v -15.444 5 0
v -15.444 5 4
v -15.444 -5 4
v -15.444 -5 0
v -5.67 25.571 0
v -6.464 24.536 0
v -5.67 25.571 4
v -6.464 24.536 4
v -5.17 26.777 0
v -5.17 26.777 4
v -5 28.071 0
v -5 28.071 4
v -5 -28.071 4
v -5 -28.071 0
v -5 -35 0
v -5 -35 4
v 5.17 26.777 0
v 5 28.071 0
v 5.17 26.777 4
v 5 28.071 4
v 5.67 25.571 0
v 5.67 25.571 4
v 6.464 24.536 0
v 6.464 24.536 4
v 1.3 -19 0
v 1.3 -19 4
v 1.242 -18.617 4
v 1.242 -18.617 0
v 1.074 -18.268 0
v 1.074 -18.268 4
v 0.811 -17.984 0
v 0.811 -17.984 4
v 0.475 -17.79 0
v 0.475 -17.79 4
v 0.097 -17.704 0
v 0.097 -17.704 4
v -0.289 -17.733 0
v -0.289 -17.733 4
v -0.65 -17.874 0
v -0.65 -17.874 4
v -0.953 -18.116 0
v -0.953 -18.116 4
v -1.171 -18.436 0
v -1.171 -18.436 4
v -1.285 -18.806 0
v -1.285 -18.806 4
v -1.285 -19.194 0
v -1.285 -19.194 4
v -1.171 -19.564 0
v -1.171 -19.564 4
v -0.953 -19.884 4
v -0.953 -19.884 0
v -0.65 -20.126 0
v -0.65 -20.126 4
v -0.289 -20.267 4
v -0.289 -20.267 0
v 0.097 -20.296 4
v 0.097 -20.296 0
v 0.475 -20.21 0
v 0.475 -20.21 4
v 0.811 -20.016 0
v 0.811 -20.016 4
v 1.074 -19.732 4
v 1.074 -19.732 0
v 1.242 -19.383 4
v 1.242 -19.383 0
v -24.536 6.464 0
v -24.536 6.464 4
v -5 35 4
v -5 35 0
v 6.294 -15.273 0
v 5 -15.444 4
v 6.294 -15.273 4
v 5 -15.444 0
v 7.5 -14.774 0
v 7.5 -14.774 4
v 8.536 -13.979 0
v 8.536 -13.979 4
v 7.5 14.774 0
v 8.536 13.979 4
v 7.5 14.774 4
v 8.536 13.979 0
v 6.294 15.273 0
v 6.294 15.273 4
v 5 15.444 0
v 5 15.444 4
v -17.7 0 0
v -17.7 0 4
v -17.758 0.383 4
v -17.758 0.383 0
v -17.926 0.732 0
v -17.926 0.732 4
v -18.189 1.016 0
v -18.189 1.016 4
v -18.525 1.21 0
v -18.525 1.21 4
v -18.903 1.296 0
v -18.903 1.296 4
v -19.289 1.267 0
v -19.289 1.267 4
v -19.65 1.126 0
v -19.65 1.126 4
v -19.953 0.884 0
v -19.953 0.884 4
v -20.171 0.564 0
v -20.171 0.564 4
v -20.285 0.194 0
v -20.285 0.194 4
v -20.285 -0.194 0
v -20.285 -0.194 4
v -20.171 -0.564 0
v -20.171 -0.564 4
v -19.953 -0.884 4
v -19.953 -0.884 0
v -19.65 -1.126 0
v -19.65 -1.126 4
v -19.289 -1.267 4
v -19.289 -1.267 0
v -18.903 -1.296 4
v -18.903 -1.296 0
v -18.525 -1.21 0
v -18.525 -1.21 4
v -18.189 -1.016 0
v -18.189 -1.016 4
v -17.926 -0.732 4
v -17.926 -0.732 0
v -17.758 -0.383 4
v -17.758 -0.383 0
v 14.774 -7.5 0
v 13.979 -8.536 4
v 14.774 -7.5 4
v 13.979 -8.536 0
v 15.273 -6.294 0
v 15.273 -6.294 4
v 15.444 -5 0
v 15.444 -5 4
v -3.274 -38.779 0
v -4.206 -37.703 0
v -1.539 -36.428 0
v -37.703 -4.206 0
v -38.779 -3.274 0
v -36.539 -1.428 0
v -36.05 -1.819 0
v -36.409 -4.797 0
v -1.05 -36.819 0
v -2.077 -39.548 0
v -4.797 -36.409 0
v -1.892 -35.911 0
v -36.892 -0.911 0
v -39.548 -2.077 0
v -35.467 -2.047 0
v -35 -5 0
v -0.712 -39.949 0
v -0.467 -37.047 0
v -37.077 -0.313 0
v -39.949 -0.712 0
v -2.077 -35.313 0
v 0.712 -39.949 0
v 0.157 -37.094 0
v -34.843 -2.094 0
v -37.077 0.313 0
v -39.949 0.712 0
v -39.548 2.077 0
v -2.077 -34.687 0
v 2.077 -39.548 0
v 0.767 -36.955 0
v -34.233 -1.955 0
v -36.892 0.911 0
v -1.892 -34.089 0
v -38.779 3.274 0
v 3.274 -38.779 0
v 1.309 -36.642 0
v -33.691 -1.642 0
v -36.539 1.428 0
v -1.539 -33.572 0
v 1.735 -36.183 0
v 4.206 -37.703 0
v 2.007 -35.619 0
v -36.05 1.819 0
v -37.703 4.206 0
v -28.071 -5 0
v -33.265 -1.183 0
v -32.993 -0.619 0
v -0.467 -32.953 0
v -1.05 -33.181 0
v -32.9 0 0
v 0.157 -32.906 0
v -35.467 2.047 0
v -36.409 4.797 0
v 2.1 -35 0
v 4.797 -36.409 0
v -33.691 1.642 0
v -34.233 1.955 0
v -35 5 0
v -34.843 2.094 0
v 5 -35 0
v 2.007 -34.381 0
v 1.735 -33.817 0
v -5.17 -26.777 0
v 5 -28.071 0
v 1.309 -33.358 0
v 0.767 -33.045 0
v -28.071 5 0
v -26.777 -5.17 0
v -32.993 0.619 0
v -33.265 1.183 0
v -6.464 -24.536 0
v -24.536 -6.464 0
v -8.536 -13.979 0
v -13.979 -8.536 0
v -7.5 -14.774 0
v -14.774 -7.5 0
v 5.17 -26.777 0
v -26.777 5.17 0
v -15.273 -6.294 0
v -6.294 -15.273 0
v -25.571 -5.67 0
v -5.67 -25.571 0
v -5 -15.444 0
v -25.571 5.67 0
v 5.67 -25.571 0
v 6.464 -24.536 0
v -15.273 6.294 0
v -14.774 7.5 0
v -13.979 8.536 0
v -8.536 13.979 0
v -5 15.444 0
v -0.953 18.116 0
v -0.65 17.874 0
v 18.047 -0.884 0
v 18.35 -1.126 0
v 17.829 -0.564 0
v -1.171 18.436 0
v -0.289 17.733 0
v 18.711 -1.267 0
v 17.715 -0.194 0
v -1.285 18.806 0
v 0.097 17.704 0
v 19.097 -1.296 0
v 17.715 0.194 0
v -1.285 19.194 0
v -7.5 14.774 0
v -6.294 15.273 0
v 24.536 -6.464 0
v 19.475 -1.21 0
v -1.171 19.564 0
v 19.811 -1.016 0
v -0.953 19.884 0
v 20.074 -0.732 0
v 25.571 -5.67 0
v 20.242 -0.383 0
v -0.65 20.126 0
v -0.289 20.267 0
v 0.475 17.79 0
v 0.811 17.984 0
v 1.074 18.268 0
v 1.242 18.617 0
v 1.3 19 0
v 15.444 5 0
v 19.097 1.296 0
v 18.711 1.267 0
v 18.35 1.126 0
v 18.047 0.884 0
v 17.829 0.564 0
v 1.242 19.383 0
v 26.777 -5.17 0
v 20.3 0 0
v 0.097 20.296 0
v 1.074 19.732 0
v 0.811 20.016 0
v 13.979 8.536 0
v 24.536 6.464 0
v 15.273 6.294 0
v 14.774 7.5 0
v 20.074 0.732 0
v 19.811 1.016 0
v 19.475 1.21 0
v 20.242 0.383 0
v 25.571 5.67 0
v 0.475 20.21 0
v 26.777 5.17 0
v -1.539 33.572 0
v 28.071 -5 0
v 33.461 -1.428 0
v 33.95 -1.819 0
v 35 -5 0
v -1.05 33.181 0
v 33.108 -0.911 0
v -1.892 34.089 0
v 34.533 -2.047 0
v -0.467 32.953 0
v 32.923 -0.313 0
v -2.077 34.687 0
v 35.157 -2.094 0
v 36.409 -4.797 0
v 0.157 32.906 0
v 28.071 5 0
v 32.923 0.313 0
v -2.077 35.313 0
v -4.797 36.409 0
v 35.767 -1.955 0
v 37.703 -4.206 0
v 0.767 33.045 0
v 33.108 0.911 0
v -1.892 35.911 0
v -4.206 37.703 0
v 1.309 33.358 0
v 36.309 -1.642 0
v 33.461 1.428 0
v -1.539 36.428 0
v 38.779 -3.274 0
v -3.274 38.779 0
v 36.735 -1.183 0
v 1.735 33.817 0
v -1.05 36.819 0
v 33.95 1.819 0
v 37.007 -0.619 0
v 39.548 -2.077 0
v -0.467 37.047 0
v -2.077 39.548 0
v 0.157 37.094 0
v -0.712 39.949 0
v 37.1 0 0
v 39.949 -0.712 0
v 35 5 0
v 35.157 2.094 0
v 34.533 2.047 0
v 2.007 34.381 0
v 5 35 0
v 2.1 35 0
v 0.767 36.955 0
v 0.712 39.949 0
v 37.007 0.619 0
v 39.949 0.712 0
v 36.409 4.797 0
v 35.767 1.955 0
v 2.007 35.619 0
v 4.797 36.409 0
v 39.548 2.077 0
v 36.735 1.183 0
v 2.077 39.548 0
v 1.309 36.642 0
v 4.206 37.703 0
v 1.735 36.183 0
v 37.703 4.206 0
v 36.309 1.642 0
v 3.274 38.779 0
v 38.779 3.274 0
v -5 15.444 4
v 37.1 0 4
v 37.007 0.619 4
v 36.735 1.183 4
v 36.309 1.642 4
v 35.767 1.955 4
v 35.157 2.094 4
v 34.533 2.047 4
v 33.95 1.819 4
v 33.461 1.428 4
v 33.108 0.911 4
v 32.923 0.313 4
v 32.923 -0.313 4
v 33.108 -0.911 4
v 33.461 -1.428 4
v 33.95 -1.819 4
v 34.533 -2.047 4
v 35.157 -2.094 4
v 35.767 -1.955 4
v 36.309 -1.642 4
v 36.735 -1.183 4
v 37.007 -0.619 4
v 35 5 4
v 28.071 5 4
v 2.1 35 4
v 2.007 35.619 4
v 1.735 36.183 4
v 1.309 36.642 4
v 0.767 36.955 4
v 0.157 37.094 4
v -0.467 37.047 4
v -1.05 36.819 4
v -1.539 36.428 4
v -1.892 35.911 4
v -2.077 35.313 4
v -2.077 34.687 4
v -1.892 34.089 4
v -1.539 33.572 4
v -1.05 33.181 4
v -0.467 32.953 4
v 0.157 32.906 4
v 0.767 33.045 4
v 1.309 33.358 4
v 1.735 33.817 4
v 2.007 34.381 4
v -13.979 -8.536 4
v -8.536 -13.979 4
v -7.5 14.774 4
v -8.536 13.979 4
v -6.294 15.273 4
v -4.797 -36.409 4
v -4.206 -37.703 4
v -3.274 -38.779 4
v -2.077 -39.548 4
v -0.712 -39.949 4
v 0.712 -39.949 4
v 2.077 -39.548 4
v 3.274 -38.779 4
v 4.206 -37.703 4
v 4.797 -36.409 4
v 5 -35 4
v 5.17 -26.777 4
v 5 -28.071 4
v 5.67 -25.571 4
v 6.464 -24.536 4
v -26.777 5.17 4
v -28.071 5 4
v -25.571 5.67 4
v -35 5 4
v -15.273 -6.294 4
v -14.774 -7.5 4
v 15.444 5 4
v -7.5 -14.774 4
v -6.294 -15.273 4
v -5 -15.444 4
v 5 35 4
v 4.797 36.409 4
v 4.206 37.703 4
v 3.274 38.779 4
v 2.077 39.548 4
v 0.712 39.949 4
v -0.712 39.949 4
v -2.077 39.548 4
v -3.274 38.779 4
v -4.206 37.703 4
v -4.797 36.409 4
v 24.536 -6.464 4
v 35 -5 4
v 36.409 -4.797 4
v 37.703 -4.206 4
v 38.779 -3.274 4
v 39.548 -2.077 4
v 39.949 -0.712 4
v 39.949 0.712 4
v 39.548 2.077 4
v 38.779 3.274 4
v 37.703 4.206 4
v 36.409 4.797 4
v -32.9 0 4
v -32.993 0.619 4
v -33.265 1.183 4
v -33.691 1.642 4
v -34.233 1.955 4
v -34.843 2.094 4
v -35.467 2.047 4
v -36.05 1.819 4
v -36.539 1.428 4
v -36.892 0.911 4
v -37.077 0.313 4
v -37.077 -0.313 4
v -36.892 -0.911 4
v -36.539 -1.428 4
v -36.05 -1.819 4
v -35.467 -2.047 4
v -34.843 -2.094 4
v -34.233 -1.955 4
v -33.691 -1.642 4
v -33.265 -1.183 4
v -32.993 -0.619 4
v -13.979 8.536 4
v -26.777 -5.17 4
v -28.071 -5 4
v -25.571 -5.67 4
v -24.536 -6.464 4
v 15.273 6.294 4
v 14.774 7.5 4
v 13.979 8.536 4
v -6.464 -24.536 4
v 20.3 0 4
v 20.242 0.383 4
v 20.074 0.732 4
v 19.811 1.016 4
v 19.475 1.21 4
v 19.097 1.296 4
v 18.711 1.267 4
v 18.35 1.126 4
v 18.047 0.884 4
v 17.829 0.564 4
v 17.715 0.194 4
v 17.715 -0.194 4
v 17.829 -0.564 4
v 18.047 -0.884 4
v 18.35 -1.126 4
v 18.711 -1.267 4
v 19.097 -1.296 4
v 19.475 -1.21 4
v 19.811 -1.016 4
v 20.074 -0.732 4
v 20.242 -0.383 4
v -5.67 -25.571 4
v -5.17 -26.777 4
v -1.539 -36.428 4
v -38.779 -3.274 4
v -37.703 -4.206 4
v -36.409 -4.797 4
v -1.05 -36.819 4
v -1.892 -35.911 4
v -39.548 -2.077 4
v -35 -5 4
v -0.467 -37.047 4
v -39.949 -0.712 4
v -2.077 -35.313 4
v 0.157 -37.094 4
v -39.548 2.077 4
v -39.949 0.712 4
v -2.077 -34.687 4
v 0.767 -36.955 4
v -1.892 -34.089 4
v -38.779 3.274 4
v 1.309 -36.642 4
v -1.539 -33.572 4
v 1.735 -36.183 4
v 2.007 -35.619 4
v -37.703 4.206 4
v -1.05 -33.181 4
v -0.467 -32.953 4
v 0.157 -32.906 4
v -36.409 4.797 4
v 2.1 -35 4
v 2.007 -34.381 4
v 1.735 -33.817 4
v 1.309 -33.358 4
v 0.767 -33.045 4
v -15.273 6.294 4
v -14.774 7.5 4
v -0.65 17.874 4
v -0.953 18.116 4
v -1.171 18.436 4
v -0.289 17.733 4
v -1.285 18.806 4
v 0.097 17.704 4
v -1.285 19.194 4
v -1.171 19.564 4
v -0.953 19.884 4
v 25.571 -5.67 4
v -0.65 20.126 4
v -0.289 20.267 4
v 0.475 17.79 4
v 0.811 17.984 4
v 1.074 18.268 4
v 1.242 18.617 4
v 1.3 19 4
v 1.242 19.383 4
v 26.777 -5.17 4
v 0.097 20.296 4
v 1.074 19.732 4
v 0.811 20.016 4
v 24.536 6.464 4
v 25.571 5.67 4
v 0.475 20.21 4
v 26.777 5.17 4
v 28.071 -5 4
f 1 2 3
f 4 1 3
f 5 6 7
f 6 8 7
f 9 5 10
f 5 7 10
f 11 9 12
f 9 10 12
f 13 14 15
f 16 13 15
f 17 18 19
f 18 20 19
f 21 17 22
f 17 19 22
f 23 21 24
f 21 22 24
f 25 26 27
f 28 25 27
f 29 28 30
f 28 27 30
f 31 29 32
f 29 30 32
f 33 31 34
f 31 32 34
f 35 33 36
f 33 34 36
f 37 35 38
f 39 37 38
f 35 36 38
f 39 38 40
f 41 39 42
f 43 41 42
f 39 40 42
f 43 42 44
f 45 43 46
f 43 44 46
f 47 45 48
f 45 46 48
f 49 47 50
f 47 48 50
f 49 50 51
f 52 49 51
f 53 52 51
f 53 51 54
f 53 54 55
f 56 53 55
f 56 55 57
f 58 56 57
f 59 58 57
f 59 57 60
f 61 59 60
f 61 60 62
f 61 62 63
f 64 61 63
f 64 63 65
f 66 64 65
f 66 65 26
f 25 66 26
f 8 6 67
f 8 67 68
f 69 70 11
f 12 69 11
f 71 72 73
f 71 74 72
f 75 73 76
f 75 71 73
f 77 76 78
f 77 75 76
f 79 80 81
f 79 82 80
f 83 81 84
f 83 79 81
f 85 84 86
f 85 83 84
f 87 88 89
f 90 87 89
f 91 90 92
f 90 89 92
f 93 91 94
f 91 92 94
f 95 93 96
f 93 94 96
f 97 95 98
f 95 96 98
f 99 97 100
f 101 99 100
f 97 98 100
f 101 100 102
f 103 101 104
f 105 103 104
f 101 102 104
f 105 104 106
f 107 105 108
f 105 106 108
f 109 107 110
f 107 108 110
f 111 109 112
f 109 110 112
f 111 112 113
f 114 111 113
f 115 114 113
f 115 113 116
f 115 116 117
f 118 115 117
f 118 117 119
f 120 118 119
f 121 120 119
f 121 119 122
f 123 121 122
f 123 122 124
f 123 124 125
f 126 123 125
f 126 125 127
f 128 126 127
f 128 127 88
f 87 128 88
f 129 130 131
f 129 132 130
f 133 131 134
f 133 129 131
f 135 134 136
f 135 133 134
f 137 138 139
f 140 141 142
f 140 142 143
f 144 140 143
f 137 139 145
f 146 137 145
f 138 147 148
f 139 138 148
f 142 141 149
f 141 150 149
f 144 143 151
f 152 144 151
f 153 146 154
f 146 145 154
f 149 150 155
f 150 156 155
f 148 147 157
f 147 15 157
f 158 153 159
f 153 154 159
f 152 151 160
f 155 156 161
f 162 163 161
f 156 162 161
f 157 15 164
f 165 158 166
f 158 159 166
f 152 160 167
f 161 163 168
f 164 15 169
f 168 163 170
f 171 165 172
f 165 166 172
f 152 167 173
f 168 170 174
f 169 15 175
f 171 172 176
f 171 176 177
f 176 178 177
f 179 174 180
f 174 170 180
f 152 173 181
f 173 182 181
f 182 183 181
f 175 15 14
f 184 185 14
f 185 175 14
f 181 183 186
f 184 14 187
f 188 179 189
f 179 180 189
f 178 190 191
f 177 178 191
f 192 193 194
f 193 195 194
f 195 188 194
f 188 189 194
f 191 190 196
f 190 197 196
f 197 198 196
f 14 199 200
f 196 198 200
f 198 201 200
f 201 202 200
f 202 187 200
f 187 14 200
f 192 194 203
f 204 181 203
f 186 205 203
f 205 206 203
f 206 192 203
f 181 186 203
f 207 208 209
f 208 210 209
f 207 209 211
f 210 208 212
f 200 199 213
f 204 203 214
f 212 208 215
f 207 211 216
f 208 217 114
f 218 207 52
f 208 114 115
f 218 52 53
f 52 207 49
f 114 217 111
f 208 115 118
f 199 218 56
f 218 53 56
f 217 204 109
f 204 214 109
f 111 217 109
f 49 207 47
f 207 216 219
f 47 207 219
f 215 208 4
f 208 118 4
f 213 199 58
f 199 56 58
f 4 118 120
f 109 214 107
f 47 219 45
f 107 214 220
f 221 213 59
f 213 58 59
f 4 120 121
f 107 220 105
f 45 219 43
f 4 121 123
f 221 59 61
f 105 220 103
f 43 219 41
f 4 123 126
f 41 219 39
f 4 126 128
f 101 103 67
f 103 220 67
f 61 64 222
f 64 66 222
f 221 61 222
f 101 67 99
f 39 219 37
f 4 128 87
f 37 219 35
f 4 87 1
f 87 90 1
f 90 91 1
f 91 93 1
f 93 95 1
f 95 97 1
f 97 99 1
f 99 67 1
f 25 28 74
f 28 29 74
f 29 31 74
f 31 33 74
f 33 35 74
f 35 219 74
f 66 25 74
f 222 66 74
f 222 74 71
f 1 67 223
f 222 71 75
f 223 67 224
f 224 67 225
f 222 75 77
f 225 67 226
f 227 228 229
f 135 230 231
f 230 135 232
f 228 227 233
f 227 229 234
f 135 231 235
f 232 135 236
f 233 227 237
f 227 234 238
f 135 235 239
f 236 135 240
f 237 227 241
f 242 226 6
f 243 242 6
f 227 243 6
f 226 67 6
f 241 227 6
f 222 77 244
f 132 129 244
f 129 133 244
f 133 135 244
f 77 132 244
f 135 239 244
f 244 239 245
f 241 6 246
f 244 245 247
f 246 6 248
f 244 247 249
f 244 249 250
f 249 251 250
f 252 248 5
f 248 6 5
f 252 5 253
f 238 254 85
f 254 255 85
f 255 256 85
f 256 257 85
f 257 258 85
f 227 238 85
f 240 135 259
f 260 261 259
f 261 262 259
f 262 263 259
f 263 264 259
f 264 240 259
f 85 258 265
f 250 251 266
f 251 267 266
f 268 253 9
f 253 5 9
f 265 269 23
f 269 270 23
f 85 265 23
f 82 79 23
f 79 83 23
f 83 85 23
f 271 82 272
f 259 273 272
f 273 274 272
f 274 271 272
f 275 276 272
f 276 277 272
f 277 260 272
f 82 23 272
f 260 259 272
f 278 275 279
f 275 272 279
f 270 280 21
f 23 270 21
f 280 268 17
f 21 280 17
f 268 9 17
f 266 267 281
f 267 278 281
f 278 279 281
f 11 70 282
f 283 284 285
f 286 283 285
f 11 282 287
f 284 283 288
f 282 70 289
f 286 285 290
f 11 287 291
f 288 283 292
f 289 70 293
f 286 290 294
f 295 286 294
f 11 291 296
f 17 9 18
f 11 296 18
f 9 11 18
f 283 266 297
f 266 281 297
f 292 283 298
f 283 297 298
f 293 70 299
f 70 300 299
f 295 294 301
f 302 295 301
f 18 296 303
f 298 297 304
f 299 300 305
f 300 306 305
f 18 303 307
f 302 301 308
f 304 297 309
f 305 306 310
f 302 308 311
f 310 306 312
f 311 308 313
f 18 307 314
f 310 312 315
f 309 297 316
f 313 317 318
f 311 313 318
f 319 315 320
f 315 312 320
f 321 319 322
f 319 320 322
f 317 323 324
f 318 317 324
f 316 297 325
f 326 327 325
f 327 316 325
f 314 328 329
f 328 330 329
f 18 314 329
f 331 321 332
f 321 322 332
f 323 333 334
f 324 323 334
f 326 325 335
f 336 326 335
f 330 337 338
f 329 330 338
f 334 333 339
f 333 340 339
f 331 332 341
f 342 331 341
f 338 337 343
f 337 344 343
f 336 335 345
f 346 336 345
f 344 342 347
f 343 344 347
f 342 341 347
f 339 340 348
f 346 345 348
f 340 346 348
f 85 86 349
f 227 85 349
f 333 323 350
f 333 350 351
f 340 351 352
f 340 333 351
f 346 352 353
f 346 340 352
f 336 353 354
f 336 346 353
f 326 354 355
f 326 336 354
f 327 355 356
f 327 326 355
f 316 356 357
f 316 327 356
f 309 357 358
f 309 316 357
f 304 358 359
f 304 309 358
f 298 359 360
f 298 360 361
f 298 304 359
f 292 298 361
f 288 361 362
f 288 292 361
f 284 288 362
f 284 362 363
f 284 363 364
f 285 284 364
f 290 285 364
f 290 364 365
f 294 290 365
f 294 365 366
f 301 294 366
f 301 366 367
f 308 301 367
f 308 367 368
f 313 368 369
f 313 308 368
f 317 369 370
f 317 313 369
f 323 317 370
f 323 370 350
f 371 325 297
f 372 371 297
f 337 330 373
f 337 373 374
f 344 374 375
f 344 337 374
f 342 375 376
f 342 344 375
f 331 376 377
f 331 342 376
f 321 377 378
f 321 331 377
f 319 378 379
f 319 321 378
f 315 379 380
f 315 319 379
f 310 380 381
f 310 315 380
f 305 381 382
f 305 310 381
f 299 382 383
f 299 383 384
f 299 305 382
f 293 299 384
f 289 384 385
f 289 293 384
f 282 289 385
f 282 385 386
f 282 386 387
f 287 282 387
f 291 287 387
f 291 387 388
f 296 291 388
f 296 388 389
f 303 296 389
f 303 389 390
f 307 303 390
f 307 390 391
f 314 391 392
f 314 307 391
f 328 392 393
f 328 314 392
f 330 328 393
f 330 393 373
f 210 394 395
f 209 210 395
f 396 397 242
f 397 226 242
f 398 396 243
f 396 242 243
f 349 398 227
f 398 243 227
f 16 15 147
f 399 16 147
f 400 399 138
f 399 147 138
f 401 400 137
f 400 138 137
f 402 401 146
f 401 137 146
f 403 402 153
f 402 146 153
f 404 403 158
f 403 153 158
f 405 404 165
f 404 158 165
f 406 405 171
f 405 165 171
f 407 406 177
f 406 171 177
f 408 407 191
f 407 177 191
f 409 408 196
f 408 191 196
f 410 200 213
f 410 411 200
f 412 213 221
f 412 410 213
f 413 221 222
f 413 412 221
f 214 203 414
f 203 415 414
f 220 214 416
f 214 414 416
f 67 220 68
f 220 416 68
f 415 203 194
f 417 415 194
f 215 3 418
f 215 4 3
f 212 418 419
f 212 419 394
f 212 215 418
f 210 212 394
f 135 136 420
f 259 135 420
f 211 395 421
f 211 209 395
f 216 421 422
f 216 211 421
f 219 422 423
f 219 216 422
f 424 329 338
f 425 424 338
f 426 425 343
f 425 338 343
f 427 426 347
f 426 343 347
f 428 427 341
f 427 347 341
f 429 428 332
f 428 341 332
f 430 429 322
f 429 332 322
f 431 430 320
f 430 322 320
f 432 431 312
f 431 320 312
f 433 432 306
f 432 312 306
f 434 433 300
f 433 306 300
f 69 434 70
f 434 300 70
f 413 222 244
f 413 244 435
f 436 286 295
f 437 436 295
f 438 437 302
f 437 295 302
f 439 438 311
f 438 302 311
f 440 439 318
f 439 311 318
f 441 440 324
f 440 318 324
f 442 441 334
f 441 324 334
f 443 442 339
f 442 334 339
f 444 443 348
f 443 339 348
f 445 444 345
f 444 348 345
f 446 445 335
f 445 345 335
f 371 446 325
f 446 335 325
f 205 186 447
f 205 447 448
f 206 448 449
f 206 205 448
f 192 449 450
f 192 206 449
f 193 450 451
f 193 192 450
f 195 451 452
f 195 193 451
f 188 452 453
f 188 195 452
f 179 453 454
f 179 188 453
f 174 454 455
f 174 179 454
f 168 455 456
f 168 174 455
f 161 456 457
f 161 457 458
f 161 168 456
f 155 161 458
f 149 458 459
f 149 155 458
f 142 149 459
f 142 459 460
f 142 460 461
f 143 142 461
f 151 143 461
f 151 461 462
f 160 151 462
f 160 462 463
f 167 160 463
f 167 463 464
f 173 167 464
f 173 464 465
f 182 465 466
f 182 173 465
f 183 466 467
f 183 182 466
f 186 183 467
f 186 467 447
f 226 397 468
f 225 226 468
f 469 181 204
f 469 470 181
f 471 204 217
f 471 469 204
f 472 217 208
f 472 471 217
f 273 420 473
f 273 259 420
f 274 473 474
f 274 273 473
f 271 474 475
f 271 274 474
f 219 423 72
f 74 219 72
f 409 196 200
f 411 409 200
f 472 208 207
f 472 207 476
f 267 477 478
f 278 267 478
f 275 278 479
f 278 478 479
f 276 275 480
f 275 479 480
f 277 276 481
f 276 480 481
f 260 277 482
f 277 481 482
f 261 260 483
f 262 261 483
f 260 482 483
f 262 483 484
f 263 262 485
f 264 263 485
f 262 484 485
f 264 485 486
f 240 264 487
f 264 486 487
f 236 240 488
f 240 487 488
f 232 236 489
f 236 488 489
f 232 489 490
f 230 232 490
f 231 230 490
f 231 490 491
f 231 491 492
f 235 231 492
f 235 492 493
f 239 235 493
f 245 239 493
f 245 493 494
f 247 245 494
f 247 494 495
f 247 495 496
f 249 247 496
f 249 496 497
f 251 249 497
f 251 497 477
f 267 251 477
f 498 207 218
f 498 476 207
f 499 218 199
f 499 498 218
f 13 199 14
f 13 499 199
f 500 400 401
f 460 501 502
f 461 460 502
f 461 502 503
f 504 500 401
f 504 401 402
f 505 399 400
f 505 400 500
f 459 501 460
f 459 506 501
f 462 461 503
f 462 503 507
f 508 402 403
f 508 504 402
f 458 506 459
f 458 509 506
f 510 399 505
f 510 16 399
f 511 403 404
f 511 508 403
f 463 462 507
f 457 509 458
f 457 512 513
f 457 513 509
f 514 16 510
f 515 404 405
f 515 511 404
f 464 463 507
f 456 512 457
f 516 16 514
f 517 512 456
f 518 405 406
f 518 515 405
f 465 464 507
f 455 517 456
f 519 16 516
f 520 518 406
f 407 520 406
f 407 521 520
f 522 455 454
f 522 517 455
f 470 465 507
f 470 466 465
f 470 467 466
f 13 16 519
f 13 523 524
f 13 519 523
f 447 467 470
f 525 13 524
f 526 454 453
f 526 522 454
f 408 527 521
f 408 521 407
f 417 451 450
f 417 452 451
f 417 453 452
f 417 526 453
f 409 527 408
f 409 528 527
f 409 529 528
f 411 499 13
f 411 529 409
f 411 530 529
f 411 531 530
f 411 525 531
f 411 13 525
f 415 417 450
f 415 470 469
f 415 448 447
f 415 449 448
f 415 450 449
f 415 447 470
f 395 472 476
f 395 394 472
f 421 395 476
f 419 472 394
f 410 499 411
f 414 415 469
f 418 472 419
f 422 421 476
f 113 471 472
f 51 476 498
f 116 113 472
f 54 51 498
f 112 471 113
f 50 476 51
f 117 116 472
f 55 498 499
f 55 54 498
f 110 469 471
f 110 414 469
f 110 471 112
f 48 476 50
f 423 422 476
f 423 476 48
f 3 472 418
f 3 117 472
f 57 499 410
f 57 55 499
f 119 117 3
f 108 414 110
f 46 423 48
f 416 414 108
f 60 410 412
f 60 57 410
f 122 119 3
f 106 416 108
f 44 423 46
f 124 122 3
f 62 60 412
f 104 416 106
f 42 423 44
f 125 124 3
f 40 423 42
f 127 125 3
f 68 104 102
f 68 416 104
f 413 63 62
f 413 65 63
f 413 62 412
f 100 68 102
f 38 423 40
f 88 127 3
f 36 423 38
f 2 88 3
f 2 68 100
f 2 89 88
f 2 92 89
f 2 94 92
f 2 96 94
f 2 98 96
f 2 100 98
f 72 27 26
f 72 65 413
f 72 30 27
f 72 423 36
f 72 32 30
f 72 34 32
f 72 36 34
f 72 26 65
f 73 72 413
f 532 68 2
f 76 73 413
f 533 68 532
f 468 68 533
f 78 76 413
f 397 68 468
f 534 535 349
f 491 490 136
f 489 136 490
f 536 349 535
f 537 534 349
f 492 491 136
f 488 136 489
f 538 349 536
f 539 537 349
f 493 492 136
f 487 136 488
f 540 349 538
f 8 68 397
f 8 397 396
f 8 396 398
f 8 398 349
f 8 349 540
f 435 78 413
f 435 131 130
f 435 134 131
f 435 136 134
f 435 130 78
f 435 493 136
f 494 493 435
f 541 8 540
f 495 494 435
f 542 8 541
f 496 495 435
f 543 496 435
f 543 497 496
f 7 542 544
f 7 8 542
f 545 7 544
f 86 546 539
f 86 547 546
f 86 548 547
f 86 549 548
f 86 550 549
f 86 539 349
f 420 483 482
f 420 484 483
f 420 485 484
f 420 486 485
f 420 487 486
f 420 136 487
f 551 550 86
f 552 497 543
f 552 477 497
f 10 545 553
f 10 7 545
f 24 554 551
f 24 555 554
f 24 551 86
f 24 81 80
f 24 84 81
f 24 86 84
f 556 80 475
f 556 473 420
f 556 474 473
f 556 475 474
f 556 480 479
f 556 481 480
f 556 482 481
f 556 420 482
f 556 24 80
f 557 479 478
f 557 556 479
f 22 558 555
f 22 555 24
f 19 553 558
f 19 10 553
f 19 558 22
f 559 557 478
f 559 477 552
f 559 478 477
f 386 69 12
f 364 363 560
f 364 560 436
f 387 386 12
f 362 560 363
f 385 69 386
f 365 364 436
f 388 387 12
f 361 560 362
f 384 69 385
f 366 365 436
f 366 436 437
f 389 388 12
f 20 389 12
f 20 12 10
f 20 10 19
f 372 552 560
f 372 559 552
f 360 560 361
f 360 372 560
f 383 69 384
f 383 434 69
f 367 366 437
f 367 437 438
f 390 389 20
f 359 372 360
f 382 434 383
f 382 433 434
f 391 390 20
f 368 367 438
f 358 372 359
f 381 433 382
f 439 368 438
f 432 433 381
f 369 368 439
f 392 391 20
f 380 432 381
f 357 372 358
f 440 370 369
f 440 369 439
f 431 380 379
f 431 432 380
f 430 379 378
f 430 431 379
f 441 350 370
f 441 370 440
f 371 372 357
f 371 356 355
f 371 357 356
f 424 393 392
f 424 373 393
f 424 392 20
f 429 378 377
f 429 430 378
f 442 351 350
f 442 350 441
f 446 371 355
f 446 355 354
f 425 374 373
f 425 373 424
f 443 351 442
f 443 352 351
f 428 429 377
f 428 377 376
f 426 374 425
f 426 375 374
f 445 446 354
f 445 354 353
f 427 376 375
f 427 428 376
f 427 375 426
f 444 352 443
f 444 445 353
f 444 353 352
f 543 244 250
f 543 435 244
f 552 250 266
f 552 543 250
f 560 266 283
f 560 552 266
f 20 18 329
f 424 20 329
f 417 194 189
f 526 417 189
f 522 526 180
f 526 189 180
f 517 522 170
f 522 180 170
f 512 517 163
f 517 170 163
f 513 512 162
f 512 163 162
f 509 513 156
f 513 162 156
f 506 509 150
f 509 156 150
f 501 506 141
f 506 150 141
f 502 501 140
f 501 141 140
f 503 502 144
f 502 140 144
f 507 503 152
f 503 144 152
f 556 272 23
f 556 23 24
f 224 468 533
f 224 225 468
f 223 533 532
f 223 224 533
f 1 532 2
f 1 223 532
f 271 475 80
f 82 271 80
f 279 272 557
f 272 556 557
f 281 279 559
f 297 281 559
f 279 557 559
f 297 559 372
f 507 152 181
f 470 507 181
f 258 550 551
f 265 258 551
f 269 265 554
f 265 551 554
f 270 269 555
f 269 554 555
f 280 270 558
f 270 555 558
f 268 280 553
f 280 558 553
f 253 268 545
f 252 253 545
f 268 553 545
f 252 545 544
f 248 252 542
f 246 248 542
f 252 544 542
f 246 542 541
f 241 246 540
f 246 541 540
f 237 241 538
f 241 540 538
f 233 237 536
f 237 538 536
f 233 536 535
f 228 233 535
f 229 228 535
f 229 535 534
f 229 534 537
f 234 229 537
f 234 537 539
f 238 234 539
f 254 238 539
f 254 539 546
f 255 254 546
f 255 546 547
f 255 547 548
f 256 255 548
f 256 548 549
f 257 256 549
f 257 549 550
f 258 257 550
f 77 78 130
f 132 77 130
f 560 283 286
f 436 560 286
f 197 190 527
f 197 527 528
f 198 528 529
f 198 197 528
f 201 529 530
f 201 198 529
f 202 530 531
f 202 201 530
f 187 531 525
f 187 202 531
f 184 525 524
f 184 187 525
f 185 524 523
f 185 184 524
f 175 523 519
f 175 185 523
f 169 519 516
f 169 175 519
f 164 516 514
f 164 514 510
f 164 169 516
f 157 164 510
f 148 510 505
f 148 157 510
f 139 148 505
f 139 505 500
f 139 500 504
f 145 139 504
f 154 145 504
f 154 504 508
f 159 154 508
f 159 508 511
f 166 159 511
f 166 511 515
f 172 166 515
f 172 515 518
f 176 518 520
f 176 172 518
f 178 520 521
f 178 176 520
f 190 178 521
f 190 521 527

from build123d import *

# Parameters (mm, degrees)
SKETCH_1_R          = 2.1
SKETCH_1_W          = 10
SKETCH_1_H          = 10
EXTRUDE_1_DEPTH     = 4
CHAMFER_1_SIZE      = 21
SKETCH_2_R          = 1.3
CUT_EXTRUDE_1_DEPTH = 57.709787515
FILLET_3_R          = 5


with BuildPart() as part:
    # 草图1 → 凸台-拉伸1 (new body)
    # profile 1 of 5: a face of its own
    with BuildSketch(Plane.XY):
        with BuildLine():
            Line((5, 5), (5, 35))
            ThreePointArc((5, 35), (0, 40), (-5, 35))
            Line((-5, 35), (-5, 5))
            Line((-5, 5), (5, 5))
        make_face()
        with Locations((0, 35)):
            Circle(SKETCH_1_R, mode=Mode.SUBTRACT)
    # profile 2 of 5: a face of its own
    with BuildSketch(Plane.XY):
        with BuildLine():
            Line((5, -35), (5, -5))
            Line((5, -5), (-5, -5))
            Line((-5, -5), (-5, -35))
            ThreePointArc((-5, -35), (0, -40), (5, -35))
        make_face()
        with Locations((0, -35)):
            Circle(SKETCH_1_R, mode=Mode.SUBTRACT)
    # profile 3 of 5: a face of its own
    with BuildSketch(Plane.XY):
        Rectangle(SKETCH_1_W, SKETCH_1_H)
    # profile 4 of 5: a face of its own
    with BuildSketch(Plane.XY):
        with BuildLine():
            Line((35, 5), (5, 5))
            Line((5, 5), (5, -5))
            Line((5, -5), (35, -5))
            ThreePointArc((35, -5), (40, 0), (35, 5))
        make_face()
        with Locations((35, 0)):
            Circle(SKETCH_1_R, mode=Mode.SUBTRACT)
    # profile 5 of 5: a face of its own
    with BuildSketch(Plane.XY):
        with BuildLine():
            Line((-5, -5), (-5, 5))
            Line((-5, 5), (-35, 5))
            ThreePointArc((-35, 5), (-40, 0), (-35, -5))
            Line((-35, -5), (-5, -5))
        make_face()
        with Locations((-35, 0)):
            Circle(SKETCH_1_R, mode=Mode.SUBTRACT)
    extrude(amount=EXTRUDE_1_DEPTH)

    # 倒角1
    chamfer_1_edges = [part.edges().sort_by_distance(p)[0] for p in [
        (5, 5, 2),
        (5, -5, 2),
        (-5, -5, 2),
        (-5, 5, 2),
    ]]
    chamfer(chamfer_1_edges, length=CHAMFER_1_SIZE)

    # 草图2 → 切除-拉伸1 (cut, through all)
    with BuildSketch(Plane.XY.offset(4)):
        with Locations((0, 19)):
            Circle(SKETCH_2_R)
        with Locations((19, 0)):
            Circle(SKETCH_2_R)
        with Locations((0, -19)):
            Circle(SKETCH_2_R)
        with Locations((-19, 0)):
            Circle(SKETCH_2_R)
        Polygon((-7.071067812, 15.443650814), (-15.443650814, 7.071067812), (-15.443650814, -7.071067812), (-7.071067812, -15.443650814), (7.071067812, -15.443650814), (15.443650814, -7.071067812), (15.443650814, 7.071067812), (7.071067812, 15.443650814), align=None)
    extrude(amount=-CUT_EXTRUDE_1_DEPTH, mode=Mode.SUBTRACT)

    # 圆角3
    fillet_3_edges = [part.edges().sort_by_distance(p)[0] for p in [
        (15.443650814, -7.071067812, 2),
        (7.071067812, -15.443650814, 2),
        (-7.071067812, -15.443650814, 2),
        (-15.443650814, -7.071067812, 2),
        (-15.443650814, 7.071067812, 2),
        (-5, -26, 2),
        (-26, -5, 2),
        (26, -5, 2),
        (5, -26, 2),
        (5, 26, 2),
        (26, 5, 2),
        (-26, 5, 2),
        (-5, 26, 2),
        (-7.071067812, 15.443650814, 2),
        (7.071067812, 15.443650814, 2),
        (15.443650814, 7.071067812, 2),
    ]]
    fillet(fillet_3_edges, radius=FILLET_3_R)


solid = part.part
